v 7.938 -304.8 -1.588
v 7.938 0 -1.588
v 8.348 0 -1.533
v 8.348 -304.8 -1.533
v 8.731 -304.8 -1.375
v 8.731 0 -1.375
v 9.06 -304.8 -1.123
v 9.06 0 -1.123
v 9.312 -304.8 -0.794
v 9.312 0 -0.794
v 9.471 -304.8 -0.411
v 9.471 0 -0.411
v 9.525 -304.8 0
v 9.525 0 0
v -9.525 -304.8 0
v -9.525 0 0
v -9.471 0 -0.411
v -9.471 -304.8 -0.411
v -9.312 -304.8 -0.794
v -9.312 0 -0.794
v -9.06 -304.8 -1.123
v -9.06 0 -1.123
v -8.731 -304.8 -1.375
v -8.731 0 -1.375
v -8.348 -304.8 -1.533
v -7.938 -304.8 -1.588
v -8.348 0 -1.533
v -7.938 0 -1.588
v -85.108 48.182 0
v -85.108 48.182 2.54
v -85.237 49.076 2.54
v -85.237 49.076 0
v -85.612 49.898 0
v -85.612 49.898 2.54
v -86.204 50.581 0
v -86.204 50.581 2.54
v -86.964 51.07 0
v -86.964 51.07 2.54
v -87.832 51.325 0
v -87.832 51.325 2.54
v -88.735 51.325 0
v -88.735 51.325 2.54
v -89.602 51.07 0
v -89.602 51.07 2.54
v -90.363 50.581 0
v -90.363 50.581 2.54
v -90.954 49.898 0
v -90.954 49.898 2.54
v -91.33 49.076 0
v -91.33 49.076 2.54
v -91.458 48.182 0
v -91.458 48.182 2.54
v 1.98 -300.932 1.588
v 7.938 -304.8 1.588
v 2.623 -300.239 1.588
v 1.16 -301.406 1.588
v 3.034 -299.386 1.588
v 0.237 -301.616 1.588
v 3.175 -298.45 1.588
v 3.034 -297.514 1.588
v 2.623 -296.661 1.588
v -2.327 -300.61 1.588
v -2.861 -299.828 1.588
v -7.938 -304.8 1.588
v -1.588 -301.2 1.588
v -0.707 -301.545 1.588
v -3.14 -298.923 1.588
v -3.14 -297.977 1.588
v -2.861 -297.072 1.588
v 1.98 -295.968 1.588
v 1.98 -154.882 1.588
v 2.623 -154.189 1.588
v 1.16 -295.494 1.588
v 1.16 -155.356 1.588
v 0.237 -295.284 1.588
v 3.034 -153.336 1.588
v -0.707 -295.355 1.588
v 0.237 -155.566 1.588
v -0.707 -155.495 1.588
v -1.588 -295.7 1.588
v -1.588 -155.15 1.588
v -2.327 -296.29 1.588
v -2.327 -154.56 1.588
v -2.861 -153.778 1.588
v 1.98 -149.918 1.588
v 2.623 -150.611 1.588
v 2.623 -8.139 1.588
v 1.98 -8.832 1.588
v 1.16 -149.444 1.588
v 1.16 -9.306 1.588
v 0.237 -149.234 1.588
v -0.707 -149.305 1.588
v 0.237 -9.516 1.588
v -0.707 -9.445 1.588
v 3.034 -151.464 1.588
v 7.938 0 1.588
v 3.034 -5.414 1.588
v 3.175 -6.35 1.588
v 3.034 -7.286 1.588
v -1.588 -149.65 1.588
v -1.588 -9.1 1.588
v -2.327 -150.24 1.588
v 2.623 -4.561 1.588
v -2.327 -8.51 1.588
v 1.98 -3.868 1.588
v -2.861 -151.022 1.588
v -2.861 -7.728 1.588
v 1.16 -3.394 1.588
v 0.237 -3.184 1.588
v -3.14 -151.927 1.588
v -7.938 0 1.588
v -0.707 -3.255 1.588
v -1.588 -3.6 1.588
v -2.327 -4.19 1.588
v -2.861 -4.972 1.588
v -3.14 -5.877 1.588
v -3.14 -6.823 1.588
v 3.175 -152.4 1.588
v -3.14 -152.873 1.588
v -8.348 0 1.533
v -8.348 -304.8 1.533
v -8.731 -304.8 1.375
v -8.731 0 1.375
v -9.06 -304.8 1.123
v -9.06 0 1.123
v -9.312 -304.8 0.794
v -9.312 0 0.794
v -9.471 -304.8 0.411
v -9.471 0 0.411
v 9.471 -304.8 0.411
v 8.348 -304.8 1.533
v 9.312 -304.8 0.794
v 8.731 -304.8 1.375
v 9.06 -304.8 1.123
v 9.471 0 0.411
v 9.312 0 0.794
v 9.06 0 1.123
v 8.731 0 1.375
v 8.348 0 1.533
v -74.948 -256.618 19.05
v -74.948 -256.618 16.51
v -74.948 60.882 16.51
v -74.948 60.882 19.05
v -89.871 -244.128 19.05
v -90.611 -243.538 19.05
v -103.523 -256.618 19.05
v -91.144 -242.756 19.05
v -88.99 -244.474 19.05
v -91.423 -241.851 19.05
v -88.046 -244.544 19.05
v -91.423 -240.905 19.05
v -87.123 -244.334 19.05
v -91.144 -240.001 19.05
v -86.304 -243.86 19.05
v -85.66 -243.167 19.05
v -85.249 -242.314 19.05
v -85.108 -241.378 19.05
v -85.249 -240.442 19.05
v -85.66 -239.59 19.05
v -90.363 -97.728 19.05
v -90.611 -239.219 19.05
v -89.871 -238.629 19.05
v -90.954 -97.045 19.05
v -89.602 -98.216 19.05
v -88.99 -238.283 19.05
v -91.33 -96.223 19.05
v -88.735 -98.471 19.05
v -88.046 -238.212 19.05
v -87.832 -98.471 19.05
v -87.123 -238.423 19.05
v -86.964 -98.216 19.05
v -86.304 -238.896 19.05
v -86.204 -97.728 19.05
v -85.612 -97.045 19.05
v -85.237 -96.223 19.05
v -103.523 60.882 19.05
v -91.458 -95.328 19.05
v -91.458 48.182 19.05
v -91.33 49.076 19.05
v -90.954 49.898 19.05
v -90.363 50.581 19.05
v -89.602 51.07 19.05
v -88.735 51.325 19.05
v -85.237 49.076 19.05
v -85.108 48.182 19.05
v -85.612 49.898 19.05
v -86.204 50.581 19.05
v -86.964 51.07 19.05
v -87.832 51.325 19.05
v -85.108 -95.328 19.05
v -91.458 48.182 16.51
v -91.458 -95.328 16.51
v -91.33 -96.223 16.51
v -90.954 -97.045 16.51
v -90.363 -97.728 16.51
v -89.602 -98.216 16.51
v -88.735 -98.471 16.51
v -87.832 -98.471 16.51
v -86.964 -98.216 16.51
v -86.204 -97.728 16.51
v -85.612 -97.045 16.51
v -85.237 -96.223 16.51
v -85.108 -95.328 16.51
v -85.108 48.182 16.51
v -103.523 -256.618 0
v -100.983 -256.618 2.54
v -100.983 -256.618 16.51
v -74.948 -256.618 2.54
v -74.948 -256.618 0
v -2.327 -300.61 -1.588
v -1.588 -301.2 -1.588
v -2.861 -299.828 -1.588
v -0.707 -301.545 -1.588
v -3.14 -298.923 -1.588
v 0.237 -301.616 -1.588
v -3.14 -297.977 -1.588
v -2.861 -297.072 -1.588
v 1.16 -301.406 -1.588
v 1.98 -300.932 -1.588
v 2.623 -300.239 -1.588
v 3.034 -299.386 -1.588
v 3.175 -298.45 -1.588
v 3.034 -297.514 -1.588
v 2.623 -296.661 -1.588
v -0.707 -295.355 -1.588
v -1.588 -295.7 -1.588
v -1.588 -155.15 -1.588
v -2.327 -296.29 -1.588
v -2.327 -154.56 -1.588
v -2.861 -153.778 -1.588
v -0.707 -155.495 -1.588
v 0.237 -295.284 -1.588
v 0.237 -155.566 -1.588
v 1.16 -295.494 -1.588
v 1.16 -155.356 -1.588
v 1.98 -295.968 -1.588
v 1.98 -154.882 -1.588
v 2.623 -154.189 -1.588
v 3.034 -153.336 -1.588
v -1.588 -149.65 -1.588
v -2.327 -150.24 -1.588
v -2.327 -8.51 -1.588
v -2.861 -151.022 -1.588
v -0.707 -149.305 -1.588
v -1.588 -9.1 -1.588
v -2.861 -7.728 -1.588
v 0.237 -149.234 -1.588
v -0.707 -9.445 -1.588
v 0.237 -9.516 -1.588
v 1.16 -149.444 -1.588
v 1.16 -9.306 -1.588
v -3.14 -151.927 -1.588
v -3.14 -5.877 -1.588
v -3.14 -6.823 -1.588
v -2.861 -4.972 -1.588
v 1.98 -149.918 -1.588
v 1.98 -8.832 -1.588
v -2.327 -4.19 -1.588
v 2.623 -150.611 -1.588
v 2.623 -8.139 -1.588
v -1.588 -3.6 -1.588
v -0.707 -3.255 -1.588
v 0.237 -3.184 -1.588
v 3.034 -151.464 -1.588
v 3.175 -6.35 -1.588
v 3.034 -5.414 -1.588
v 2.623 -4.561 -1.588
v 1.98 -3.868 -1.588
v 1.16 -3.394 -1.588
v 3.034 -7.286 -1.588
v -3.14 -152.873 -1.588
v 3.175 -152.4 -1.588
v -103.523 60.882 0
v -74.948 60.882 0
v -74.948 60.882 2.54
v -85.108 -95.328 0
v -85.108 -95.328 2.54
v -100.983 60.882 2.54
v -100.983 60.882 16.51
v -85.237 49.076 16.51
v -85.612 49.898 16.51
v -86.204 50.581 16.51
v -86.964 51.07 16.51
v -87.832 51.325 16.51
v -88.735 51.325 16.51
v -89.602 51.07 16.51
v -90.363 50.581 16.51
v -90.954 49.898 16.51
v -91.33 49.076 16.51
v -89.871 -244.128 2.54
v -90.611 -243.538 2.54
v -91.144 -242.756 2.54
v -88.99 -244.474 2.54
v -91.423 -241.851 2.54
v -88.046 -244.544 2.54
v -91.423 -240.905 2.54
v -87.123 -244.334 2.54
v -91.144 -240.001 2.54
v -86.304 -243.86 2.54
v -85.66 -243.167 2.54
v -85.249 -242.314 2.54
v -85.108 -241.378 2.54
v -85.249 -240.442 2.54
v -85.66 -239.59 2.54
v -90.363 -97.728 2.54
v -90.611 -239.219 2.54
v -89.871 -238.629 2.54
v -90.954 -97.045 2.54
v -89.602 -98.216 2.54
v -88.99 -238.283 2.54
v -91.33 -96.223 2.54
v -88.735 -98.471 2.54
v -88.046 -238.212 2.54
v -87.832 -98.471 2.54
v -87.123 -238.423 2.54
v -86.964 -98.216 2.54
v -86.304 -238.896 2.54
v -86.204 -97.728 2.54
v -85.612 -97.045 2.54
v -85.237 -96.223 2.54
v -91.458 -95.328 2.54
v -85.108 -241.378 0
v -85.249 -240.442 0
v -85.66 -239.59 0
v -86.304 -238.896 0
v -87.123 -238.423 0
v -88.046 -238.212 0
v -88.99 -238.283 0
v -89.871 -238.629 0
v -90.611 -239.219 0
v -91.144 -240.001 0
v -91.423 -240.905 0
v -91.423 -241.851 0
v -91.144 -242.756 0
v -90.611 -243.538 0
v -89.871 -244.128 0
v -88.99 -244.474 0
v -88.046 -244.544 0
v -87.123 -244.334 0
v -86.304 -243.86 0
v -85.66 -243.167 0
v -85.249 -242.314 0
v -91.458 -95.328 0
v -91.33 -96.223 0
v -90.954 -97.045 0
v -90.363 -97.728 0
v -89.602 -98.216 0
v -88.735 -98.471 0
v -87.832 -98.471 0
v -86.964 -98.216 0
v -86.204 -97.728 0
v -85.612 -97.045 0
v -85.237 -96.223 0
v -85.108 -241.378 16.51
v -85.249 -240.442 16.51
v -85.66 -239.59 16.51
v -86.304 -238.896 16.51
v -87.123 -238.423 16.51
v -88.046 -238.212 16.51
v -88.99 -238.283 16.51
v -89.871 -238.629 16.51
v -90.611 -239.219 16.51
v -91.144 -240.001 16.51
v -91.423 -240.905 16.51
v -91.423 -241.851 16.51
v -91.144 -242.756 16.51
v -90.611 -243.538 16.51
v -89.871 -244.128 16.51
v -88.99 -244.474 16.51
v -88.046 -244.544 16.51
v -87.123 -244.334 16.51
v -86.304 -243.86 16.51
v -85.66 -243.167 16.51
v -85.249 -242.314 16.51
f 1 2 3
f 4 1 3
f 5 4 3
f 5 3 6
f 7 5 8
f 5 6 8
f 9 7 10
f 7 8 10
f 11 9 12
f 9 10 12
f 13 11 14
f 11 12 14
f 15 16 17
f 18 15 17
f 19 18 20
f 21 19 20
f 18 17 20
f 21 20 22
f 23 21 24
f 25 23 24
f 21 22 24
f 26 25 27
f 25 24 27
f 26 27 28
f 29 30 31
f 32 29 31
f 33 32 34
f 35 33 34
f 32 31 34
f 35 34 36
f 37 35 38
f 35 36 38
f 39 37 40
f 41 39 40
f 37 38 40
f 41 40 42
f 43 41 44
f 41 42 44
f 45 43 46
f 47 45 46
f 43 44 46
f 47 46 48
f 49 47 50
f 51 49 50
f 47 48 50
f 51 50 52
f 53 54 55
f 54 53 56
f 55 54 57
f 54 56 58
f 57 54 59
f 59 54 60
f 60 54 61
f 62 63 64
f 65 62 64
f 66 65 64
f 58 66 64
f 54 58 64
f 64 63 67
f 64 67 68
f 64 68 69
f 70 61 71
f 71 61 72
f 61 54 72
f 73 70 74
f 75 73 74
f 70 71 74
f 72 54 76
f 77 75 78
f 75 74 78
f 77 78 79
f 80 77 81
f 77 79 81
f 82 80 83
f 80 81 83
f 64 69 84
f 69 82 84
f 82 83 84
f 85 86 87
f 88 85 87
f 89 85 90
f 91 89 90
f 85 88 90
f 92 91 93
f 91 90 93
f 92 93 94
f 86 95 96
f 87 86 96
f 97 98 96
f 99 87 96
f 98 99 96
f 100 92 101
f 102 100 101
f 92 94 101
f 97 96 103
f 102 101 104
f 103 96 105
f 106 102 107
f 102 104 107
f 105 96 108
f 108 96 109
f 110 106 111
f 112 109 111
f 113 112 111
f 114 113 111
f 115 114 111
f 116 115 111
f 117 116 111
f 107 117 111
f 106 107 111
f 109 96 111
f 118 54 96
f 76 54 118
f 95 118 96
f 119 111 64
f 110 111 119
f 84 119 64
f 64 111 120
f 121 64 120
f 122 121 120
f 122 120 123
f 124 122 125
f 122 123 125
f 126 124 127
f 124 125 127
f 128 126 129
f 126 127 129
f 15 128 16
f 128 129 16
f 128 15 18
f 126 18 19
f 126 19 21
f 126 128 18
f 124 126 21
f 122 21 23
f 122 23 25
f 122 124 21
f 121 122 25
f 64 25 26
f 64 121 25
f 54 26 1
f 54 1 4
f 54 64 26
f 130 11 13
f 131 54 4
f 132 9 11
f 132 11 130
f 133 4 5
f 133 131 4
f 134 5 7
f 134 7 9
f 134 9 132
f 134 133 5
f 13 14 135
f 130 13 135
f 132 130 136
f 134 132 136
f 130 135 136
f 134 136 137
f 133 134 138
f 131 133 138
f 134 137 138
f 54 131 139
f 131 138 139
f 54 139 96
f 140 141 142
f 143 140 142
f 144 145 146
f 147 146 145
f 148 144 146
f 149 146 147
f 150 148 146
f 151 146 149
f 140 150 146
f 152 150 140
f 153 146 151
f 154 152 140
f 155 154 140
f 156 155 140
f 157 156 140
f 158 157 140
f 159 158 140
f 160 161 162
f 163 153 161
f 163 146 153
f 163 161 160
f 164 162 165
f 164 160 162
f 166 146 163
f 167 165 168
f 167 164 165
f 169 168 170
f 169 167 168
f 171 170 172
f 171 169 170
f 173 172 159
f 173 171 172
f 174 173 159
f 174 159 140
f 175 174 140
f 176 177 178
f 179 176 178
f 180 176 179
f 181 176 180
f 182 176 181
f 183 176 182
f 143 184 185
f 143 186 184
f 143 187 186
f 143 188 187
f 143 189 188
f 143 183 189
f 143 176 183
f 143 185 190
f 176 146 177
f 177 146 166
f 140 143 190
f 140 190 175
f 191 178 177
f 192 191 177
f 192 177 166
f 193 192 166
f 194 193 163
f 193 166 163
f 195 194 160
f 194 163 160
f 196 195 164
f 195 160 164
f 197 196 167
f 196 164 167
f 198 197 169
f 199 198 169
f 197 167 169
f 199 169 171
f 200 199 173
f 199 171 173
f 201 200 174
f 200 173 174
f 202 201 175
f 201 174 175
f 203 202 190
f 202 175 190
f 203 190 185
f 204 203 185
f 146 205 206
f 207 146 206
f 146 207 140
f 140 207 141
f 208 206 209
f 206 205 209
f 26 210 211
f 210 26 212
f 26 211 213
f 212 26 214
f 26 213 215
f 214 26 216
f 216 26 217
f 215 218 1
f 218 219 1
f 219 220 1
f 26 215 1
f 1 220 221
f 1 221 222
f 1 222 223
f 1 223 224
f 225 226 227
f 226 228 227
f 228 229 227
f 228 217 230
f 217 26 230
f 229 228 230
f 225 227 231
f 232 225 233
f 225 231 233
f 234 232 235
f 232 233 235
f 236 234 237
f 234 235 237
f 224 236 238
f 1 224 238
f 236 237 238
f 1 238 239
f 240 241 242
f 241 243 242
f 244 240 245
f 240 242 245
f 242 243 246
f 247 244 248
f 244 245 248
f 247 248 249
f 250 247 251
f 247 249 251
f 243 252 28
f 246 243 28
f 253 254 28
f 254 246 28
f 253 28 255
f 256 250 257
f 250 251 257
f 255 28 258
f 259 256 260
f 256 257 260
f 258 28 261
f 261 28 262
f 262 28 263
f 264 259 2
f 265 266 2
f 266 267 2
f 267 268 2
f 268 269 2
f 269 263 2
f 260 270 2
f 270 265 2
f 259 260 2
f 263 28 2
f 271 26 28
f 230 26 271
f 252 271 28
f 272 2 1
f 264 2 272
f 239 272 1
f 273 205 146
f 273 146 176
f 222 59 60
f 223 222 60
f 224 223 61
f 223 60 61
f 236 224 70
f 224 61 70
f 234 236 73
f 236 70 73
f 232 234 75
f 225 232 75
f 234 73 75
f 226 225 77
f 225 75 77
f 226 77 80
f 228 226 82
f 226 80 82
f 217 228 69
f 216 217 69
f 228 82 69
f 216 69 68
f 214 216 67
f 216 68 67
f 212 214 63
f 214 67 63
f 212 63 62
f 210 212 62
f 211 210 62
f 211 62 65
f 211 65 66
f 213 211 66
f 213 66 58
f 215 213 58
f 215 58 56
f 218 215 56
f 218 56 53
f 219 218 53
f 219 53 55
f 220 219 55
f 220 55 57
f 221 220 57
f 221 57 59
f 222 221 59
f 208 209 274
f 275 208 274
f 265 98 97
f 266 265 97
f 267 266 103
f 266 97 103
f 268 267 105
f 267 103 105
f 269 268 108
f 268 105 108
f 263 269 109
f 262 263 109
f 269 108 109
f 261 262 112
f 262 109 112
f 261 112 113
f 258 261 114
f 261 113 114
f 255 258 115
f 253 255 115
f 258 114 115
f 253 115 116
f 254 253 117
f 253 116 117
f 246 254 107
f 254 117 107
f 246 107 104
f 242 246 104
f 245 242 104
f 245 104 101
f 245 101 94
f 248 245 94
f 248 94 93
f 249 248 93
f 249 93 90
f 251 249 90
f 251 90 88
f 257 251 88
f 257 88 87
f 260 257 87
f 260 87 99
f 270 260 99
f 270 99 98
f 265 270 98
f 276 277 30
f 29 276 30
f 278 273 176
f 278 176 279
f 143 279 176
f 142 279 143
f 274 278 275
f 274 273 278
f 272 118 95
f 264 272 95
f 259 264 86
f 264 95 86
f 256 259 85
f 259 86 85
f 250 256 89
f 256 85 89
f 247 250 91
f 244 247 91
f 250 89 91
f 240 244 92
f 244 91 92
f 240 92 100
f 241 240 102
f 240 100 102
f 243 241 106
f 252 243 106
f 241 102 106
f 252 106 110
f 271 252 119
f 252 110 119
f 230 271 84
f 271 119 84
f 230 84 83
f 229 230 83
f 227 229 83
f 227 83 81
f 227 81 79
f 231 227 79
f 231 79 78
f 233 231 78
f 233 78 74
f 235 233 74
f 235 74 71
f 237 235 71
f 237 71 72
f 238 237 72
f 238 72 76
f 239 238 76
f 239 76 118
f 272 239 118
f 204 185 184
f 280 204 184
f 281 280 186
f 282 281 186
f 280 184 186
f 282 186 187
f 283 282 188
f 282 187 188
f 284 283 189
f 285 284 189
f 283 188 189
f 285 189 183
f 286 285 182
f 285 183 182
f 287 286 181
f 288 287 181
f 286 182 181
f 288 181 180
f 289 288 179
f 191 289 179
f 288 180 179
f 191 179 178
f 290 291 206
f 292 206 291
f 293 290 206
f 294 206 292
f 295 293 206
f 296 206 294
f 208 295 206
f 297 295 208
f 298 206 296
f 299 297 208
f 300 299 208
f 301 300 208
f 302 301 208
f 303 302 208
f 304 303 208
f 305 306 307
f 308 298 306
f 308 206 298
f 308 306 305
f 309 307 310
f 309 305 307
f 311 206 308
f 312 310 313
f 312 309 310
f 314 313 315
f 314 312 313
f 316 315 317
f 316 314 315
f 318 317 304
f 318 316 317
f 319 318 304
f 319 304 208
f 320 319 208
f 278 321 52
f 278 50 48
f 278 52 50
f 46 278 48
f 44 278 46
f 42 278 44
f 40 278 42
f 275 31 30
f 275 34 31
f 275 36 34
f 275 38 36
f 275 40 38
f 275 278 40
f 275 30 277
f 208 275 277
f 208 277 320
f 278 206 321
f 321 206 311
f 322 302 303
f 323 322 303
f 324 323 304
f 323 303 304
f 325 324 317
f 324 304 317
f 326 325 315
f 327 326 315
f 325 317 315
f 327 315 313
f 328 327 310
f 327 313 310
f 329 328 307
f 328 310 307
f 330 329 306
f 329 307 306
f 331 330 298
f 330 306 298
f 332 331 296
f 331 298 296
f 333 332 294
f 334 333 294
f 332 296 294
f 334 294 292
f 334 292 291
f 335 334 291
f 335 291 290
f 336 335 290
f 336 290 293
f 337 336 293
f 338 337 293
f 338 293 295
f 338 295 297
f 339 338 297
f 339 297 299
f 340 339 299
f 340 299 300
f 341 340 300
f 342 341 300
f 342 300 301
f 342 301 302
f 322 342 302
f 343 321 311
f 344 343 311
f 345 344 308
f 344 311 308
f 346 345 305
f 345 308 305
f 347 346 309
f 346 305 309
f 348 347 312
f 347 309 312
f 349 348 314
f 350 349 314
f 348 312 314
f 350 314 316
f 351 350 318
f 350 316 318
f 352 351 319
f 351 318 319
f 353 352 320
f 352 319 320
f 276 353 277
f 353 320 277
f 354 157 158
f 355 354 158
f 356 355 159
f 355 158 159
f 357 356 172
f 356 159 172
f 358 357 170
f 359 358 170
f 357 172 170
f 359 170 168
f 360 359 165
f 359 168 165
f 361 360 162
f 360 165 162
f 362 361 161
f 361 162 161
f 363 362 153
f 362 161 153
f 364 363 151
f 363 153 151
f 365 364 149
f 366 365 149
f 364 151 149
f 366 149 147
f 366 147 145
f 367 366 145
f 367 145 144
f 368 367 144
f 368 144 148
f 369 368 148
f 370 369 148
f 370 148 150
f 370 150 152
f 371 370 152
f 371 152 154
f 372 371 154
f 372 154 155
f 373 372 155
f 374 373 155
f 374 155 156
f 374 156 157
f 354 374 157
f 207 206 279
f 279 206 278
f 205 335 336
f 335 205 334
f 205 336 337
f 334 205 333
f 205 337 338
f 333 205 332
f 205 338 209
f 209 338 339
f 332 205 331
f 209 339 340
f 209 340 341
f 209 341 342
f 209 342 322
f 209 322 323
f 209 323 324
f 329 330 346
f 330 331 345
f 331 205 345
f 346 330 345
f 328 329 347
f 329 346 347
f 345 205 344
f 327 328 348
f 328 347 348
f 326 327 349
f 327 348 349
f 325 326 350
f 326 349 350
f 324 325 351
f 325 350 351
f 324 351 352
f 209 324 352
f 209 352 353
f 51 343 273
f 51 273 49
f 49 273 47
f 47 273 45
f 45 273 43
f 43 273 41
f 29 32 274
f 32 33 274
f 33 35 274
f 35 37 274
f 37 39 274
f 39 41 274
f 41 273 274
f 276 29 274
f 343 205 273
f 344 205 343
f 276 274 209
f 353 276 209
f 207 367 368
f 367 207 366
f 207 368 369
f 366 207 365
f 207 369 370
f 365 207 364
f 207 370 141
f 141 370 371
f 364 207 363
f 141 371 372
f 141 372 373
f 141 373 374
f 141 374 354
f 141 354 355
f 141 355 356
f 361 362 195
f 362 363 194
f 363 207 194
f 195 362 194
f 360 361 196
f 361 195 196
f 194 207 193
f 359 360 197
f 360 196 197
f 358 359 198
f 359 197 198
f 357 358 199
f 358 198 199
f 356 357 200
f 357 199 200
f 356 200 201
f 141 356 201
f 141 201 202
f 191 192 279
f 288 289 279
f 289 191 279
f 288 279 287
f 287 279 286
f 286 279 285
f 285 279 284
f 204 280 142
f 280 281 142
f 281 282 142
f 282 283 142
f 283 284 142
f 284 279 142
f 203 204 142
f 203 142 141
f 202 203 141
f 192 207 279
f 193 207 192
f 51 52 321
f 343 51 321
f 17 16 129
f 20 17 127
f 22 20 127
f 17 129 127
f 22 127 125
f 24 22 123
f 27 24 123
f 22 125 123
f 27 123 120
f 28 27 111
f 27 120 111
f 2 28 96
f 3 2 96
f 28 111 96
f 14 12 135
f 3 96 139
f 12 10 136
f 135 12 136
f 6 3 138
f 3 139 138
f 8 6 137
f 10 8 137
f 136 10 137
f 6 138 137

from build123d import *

# Parameters (mm, degrees)
F1_DEPTH = 304.8
F2_R     = 3.175
F3_DEPTH = 25.4
F4_W     = 28.575
F4_H     = 317.5
F5_DEPTH = 19.05
F6_T     = -2.54
F7_R     = 3.175
F8_DEPTH = 25.4


with BuildPart() as f1:
    # F0 (on Front) → F1 (new body)
    with BuildSketch(Plane.XZ):
        with BuildLine():
            Line((7.9375, 1.5875), (-7.9375, 1.5875))
            ThreePointArc((-7.9375, 1.5875), (-9.060032, 1.122532), (-9.525, 0))
            ThreePointArc((-9.525, 0), (-9.060032, -1.122532), (-7.9375, -1.5875))
            Line((-7.9375, -1.5875), (7.9375, -1.5875))
            ThreePointArc((7.9375, -1.5875), (9.060032, -1.122532), (9.525, 0))
            ThreePointArc((9.525, 0), (9.060032, 1.122532), (7.9375, 1.5875))
        make_face()
    extrude(amount=F1_DEPTH)

    # F2 (on face) → F3 (cut)
    with BuildSketch(Plane.XY.offset(1.5875)):
        with Locations((0, -298.45)):
            Circle(F2_R)
        with Locations((0, -152.4)):
            Circle(F2_R)
        with Locations((0, -6.35)):
            Circle(F2_R)
    extrude(amount=-F3_DEPTH, mode=Mode.SUBTRACT)


with BuildPart() as f5:
    # F4 (on Top) → F5 (new body)
    with BuildSketch(Plane.XY):
        with Locations((-89.23593, -97.868138)):
            Rectangle(F4_W, F4_H)
    extrude(amount=F5_DEPTH)

    # F6
    f6_openings = [f5.faces().sort_by_distance(p)[0] for p in [
        (-74.94843, -97.868138, 9.525),
        (-89.23593, -256.618138, 9.525),
        (-89.23593, 60.881862, 9.525),
    ]]
    offset(amount=F6_T, openings=f6_openings)

    # F7 (on face) → F8 (cut)
    with BuildSketch(Plane.XY.offset(19.05)):
        with Locations((-88.28343, -241.378138)):
            Circle(F7_R)
        with BuildLine():
            Line((-91.45843, 48.181862), (-91.45843, -95.328138))
            ThreePointArc((-91.45843, -95.328138), (-88.28343, -98.503138), (-85.10843, -95.328138))
            Line((-85.10843, -95.328138), (-85.10843, 48.181862))
            ThreePointArc((-85.10843, 48.181862), (-88.28343, 51.356862), (-91.45843, 48.181862))
        make_face()
    extrude(amount=-F8_DEPTH, mode=Mode.SUBTRACT)


solid = Compound([f1.part, f5.part])
